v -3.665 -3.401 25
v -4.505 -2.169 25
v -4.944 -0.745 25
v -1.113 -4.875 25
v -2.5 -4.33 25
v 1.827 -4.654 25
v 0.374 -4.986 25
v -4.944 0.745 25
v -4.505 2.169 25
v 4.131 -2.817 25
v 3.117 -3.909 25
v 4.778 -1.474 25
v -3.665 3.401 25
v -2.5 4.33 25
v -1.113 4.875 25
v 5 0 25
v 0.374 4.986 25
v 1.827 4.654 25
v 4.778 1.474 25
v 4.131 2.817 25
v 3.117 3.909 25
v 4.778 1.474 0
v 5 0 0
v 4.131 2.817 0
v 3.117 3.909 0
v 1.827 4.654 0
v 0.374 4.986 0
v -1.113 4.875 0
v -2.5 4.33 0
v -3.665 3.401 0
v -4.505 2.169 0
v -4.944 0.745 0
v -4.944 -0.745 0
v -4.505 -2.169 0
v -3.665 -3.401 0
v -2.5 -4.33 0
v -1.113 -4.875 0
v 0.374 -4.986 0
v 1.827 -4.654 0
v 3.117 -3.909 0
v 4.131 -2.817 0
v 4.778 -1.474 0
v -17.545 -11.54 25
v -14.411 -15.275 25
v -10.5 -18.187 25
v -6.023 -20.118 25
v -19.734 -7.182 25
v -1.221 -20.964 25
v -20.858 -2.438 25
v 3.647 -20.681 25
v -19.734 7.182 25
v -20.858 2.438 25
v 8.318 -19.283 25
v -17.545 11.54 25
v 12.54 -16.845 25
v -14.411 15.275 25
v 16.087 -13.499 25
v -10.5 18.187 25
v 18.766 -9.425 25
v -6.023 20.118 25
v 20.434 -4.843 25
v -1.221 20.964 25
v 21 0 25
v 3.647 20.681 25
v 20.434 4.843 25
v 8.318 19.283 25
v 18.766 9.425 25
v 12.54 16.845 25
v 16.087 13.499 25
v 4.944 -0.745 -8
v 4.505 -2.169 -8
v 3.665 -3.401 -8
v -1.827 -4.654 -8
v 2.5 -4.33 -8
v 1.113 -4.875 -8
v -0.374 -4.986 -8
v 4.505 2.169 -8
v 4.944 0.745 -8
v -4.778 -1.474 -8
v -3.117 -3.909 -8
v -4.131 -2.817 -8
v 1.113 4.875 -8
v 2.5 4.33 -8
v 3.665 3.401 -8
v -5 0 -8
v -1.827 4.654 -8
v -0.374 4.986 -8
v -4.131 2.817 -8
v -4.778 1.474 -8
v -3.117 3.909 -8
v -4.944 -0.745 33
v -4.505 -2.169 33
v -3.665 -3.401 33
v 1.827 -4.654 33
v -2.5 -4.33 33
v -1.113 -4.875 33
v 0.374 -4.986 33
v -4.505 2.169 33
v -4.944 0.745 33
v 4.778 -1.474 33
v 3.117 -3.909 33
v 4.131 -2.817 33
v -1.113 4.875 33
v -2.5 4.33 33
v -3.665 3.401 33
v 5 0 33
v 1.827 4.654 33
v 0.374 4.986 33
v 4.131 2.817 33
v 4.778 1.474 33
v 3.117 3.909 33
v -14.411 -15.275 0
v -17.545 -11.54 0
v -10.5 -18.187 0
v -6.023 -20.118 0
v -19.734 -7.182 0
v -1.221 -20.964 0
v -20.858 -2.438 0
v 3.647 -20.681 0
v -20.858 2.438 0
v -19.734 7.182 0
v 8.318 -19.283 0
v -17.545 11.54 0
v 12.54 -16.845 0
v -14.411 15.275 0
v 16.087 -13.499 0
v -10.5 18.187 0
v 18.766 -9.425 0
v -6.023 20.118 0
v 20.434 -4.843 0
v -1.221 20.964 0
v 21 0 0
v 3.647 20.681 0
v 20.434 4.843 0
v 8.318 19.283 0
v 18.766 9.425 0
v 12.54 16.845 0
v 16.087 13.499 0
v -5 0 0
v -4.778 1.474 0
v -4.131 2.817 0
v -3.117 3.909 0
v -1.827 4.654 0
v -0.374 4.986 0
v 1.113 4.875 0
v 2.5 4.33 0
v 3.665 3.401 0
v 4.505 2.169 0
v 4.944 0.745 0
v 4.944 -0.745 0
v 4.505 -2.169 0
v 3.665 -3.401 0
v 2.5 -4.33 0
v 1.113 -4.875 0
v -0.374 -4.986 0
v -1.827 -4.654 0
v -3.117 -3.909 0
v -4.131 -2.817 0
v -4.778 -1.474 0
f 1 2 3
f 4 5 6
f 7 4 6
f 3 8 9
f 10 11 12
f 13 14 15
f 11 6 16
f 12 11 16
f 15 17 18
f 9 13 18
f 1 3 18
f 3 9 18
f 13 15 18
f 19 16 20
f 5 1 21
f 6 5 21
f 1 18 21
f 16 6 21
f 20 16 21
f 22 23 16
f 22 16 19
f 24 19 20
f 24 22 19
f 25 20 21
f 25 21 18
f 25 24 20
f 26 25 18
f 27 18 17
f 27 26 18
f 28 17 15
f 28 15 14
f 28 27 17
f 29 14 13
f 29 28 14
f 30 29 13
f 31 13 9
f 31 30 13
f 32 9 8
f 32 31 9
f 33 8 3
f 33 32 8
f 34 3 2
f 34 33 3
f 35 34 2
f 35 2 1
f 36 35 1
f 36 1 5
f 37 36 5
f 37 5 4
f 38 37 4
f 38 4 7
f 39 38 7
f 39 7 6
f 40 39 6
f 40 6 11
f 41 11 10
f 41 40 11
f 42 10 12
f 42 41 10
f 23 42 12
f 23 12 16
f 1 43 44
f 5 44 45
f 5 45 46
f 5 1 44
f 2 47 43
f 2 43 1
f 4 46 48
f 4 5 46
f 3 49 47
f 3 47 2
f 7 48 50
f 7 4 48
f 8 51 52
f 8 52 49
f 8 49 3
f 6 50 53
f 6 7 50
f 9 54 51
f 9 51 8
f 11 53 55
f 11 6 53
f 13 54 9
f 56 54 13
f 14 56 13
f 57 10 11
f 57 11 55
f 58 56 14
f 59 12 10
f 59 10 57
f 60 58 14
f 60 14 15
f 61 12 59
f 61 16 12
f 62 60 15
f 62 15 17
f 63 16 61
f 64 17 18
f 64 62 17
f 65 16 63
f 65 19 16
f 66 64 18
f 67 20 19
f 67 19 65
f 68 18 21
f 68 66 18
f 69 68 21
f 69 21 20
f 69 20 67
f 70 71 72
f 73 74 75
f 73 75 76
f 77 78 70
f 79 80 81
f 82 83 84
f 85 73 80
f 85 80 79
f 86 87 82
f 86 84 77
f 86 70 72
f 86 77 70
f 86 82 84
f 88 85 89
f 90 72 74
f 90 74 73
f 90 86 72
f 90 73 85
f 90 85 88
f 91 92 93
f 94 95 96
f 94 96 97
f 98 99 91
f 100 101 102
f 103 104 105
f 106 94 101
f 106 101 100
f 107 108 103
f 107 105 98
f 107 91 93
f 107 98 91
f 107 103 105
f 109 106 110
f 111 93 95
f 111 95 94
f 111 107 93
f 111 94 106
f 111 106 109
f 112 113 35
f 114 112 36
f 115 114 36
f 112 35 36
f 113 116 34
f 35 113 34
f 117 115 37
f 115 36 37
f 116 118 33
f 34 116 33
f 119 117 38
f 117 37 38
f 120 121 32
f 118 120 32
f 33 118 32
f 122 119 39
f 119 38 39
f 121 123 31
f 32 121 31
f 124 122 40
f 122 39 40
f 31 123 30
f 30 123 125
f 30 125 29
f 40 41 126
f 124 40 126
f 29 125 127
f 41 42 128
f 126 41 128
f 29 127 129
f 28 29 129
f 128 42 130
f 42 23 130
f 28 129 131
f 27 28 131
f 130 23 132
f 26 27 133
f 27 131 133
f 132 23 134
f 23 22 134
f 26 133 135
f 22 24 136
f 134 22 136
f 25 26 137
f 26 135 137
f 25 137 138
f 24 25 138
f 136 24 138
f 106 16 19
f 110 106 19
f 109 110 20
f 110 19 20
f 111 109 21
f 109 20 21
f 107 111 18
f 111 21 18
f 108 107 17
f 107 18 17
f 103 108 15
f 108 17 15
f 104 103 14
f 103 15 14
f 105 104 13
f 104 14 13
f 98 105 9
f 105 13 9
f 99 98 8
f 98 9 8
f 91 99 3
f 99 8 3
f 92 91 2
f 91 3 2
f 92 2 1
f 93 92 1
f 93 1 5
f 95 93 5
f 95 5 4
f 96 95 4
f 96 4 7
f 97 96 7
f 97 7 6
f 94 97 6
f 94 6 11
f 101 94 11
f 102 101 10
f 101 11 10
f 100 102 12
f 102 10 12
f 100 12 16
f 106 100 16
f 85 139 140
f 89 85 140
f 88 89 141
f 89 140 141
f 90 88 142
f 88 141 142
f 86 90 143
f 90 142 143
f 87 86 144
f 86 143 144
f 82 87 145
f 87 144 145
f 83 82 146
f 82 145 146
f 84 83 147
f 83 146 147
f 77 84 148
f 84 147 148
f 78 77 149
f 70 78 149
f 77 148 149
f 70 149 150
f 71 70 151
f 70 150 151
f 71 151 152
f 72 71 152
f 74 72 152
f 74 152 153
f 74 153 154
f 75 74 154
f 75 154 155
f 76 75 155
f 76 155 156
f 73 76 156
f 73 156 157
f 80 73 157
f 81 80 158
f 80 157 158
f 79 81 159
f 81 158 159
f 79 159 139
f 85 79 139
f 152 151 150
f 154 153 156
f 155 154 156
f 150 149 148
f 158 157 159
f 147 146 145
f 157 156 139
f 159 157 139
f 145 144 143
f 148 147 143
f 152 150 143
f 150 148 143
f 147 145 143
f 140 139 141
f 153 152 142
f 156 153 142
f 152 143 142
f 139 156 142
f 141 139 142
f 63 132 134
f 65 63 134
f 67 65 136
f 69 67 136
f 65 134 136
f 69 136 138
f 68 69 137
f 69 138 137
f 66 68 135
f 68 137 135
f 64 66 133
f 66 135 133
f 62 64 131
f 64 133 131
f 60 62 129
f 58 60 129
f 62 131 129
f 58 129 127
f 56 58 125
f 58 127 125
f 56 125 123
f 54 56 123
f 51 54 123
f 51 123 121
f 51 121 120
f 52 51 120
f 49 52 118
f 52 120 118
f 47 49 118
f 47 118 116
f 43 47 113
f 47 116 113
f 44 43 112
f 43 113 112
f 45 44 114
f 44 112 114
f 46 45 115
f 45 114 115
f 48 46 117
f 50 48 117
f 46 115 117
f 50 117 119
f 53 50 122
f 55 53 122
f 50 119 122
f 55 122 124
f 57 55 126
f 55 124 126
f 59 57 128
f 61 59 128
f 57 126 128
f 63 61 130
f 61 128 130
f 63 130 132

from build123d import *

# Parameters (mm, degrees)
SKETCH_1_R      = 21
SKETCH_1_R_2    = 5
EXTRUDE_1_DEPTH = 25
SKETCH_2_R      = 5
EXTRUDE_2_DEPTH = 8
SKETCH_3_R      = 5
EXTRUDE_3_DEPTH = 8


with BuildPart() as part:
    # 草图1 → 凸台-拉伸1 (new body)
    with BuildSketch(Plane.XY):
        Circle(SKETCH_1_R)
        Circle(SKETCH_1_R_2, mode=Mode.SUBTRACT)
    extrude(amount=EXTRUDE_1_DEPTH)


with BuildPart() as body_2:
    # 草图2 → 凸台-拉伸2 (new body)
    with BuildSketch(Plane.XY.offset(25)):
        Circle(SKETCH_2_R)
    extrude(amount=EXTRUDE_2_DEPTH)


with BuildPart() as body_3:
    # 草图3 → 凸台-拉伸3 (new body)
    with BuildSketch(Plane(origin=(0, 0, 0), x_dir=(-1, 0, 0), z_dir=(0, 0, -1))):
        Circle(SKETCH_3_R)
    extrude(amount=EXTRUDE_3_DEPTH)


solid = Compound([part.part, body_2.part, body_3.part])
